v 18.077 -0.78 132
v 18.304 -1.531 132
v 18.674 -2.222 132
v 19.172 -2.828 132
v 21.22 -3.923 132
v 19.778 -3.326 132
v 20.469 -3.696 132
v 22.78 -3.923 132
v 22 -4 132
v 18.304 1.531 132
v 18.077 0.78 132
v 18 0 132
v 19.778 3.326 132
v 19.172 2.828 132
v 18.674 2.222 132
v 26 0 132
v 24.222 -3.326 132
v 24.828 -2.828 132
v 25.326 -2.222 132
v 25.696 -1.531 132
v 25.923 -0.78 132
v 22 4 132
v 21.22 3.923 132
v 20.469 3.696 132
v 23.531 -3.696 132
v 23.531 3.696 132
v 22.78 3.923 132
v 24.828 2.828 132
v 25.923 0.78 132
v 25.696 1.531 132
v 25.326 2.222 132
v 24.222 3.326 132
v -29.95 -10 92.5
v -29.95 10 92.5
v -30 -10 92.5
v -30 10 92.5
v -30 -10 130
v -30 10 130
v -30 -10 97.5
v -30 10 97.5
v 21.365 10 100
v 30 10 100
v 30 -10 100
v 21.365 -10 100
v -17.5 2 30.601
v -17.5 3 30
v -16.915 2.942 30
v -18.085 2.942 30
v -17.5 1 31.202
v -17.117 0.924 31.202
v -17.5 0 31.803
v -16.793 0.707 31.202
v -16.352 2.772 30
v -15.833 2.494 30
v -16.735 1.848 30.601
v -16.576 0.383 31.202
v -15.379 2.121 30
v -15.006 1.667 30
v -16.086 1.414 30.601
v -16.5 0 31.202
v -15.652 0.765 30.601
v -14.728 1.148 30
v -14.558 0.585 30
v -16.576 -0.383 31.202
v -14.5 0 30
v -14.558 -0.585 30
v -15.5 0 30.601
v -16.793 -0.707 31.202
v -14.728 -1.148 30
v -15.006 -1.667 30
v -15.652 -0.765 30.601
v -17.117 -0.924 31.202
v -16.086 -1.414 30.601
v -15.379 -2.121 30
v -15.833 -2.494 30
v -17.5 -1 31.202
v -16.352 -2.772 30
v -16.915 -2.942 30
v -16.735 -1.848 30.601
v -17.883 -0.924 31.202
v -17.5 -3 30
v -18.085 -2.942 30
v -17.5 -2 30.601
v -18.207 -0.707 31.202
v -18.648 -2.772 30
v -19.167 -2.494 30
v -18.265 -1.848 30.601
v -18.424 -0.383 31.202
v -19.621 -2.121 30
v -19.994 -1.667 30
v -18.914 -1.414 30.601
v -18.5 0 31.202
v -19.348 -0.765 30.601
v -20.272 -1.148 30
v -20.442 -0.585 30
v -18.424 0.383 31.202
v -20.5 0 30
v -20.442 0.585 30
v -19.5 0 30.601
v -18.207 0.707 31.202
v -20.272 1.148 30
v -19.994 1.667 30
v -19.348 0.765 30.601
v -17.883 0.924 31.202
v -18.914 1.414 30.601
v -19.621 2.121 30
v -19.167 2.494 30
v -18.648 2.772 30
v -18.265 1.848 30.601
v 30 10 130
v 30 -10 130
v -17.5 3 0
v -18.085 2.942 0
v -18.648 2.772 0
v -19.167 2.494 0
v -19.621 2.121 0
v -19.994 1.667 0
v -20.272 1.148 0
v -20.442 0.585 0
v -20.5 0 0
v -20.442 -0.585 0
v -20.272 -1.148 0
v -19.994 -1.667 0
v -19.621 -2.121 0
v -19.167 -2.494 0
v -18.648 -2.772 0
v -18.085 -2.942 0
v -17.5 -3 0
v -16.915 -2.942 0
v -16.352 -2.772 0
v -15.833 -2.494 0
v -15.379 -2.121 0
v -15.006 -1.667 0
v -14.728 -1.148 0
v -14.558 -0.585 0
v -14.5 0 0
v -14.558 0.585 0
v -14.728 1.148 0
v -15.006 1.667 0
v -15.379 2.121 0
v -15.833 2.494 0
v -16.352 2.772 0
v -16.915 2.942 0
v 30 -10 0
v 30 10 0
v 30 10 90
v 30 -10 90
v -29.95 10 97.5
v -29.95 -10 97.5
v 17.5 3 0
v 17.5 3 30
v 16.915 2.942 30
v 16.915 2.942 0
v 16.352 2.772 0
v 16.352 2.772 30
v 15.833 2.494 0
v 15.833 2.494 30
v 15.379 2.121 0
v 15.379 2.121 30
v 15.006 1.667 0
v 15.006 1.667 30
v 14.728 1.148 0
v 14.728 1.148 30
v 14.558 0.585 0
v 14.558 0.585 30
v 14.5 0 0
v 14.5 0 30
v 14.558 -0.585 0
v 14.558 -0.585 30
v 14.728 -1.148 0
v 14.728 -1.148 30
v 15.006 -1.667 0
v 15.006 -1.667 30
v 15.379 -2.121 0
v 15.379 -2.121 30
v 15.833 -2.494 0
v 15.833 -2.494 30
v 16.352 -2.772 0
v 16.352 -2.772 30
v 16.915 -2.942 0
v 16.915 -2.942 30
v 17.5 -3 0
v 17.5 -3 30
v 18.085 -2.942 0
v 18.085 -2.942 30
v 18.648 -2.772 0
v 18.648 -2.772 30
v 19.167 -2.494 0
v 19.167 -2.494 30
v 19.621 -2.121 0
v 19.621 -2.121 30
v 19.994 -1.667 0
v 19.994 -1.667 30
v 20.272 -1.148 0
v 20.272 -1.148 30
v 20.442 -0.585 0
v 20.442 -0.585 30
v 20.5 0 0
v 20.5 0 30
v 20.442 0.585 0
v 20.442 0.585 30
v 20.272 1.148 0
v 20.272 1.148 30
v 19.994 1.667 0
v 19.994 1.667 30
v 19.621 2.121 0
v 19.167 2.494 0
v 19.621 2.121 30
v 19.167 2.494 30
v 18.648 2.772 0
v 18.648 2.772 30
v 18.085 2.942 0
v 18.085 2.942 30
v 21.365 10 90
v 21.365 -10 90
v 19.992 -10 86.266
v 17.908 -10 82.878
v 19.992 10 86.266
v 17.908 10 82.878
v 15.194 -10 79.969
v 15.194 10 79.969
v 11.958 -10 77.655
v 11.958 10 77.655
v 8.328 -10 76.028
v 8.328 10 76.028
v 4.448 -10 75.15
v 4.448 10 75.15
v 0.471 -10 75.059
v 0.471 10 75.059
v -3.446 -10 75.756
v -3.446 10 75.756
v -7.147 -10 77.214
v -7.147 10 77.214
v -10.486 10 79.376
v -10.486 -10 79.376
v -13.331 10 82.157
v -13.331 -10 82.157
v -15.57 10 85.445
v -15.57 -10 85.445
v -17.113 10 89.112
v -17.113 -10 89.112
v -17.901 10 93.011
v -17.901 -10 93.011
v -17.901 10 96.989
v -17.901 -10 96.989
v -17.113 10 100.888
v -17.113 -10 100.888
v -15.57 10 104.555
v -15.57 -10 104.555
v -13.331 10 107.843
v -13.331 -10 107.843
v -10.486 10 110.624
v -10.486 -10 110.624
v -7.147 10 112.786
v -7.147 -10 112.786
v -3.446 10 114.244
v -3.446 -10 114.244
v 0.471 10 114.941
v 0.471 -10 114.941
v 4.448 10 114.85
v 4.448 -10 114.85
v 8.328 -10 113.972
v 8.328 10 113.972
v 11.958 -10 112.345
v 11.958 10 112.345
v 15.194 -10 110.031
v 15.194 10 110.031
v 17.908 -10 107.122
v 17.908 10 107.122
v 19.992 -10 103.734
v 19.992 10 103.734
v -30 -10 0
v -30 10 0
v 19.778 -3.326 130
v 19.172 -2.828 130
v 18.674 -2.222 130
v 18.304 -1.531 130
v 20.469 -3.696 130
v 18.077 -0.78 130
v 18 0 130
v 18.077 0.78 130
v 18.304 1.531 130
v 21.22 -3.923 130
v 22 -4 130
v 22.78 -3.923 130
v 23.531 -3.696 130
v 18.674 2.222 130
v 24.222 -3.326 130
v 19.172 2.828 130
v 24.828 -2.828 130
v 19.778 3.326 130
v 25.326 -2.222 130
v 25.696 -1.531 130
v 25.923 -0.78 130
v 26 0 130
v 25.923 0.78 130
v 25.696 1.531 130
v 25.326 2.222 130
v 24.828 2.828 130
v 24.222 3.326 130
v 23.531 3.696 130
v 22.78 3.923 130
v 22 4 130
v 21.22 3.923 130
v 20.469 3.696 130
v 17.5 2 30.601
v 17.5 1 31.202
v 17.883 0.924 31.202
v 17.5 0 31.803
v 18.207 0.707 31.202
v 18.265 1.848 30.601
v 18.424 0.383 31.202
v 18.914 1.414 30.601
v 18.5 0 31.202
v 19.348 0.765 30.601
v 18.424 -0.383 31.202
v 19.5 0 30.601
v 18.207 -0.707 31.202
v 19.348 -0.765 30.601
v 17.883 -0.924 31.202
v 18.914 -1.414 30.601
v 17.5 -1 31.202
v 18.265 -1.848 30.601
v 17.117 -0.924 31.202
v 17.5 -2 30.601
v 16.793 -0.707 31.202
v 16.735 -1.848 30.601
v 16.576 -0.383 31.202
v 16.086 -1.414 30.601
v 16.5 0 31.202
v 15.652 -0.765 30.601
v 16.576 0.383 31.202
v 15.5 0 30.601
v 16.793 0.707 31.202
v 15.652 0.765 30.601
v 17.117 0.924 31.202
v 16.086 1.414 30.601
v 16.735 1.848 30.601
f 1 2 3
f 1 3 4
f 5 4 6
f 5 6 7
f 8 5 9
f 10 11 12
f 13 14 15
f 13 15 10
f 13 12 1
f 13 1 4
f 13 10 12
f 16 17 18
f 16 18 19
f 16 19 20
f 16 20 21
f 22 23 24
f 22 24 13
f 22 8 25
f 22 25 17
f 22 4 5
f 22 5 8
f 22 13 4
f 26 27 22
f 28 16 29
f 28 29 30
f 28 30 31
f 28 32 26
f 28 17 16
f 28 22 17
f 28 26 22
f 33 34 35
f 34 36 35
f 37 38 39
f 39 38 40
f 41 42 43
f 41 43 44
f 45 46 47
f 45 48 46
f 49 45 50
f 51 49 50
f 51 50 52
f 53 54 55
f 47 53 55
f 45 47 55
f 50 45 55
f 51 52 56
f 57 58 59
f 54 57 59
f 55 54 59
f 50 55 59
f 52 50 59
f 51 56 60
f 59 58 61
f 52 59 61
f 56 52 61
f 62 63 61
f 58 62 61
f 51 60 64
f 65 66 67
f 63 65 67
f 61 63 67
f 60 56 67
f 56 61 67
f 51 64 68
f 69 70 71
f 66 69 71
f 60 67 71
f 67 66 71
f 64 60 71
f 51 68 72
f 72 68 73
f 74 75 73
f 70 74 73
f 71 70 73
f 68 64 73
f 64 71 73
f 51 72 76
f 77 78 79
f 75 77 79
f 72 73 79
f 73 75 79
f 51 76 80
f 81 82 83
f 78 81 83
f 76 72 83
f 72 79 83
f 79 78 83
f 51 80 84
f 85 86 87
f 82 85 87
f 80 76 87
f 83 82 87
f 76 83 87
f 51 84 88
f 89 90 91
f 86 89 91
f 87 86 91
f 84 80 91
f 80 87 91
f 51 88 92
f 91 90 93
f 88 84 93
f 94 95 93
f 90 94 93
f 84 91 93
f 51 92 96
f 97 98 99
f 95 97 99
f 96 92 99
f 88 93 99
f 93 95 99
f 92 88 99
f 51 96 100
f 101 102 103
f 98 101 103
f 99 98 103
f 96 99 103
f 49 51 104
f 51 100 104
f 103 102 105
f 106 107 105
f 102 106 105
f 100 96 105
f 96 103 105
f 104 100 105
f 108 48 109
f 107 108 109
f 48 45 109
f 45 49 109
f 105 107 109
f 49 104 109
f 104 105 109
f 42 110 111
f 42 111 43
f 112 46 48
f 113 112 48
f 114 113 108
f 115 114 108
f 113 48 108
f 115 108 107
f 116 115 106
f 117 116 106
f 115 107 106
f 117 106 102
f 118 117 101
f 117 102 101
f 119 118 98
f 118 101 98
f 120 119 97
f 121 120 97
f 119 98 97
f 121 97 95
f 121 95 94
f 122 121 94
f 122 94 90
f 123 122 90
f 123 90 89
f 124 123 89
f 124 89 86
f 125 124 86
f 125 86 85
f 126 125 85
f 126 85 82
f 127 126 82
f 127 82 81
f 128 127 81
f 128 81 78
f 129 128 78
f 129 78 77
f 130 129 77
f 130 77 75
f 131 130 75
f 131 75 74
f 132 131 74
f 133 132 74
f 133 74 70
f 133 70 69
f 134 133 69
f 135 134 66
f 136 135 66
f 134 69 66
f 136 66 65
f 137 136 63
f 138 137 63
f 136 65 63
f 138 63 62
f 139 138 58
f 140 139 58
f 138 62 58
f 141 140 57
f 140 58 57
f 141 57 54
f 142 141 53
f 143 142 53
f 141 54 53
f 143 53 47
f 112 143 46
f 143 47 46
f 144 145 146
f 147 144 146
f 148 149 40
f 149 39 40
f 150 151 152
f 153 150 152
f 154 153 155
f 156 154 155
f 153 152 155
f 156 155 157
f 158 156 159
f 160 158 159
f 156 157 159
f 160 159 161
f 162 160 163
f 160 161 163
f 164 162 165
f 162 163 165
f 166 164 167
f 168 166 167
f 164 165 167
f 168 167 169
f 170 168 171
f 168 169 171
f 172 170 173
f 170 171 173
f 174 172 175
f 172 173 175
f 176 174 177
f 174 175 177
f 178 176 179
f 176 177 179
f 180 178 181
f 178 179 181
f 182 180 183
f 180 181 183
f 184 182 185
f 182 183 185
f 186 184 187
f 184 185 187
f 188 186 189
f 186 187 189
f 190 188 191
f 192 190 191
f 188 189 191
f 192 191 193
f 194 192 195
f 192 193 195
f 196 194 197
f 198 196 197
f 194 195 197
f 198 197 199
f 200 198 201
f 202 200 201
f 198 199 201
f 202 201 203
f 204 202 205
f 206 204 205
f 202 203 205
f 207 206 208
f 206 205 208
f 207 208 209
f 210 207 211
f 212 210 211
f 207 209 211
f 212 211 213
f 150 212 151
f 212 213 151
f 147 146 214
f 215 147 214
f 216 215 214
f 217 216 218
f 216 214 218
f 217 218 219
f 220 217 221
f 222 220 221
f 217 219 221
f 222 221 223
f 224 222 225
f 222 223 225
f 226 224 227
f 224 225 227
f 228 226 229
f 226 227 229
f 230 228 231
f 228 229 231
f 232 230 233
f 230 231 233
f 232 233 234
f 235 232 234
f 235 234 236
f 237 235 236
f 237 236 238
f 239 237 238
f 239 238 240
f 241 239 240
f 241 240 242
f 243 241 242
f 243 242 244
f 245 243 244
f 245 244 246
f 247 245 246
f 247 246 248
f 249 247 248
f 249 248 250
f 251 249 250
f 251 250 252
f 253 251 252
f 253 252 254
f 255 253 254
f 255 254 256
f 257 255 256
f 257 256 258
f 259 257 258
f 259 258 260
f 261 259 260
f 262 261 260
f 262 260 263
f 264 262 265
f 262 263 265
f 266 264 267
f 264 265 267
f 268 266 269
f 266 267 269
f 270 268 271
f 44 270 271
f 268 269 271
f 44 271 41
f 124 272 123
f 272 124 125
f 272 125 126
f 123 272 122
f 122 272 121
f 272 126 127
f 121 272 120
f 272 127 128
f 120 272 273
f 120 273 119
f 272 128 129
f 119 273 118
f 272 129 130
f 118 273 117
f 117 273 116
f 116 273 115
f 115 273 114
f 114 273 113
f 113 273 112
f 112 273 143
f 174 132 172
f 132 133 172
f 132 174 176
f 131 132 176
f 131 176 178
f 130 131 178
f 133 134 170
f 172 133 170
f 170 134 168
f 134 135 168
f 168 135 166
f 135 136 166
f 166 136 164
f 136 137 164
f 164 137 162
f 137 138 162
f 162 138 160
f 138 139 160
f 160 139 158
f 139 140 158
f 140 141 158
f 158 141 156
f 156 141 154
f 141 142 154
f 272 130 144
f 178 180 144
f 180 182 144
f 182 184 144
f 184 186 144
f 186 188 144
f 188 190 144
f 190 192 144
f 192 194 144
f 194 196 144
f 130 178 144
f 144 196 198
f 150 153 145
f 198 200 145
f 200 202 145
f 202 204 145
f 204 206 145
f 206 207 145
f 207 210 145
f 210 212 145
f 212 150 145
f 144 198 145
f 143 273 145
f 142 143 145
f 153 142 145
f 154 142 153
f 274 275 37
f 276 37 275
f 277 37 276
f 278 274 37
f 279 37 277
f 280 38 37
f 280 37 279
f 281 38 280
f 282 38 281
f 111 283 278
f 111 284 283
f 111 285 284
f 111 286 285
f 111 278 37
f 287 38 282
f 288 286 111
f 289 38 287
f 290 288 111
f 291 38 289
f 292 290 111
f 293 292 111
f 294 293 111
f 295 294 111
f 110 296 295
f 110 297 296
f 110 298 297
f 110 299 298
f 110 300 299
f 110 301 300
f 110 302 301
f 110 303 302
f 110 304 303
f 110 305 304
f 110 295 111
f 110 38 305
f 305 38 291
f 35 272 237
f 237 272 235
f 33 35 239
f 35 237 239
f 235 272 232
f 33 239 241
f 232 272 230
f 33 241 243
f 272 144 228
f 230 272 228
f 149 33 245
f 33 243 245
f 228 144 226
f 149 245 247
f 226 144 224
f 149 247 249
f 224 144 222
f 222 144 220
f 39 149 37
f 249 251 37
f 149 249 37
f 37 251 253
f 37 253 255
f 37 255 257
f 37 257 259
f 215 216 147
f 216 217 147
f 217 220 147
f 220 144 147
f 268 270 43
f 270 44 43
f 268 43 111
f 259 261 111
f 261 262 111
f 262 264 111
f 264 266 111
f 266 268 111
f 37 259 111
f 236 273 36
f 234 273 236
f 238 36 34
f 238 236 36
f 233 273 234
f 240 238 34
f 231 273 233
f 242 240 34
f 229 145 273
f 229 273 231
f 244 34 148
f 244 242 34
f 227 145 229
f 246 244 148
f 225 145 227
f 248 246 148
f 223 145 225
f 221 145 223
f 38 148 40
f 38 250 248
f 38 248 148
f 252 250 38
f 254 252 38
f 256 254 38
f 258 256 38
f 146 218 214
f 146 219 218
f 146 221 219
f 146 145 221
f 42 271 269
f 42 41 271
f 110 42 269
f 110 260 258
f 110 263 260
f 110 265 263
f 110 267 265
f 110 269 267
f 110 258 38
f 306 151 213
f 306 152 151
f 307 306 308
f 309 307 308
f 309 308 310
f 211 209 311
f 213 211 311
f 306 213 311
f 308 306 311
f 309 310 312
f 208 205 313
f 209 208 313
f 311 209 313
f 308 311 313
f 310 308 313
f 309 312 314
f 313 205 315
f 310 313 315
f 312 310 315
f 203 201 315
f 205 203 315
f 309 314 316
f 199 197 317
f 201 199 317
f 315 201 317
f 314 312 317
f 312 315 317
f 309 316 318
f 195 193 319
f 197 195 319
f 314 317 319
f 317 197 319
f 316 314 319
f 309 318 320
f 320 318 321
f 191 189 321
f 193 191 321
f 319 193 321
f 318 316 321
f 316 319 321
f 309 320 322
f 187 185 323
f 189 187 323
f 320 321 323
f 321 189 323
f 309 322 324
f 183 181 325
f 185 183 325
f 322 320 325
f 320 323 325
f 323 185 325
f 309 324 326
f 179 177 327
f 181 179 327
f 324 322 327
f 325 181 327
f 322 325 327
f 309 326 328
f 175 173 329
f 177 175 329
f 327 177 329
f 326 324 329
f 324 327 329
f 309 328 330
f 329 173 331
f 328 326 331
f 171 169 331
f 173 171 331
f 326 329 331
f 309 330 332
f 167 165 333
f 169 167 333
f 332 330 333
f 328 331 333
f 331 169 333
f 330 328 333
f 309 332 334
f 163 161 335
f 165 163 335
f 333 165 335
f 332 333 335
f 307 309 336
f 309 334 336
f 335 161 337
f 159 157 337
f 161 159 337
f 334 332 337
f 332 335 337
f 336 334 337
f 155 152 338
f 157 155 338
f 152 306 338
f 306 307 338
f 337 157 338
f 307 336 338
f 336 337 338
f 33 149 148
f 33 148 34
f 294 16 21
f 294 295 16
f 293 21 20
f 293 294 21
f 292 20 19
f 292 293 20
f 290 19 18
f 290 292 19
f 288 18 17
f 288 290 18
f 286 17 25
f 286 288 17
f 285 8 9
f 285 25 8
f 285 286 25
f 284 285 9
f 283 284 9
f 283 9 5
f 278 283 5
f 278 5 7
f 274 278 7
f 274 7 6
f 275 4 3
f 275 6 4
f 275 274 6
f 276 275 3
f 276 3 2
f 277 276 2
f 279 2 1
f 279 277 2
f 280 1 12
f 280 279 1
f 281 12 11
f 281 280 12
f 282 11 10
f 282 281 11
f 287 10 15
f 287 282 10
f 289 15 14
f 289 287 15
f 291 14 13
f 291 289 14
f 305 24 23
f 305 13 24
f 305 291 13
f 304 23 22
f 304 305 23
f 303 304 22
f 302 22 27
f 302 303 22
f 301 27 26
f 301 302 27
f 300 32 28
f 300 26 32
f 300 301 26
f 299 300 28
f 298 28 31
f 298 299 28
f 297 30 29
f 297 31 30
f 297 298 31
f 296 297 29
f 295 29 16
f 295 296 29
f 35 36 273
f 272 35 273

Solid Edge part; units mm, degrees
sketch "Sketch1" plane through (0, 0, 0) normal (0, -1, 0) x (1, 0, 0)
  line L0 (-30, 130) -> (30, 130)
  line L1 (30, 130) -> (30, 100)
  line L2 (30, 100) -> (21.3649, 100)
  line L3 (30, 90) -> (21.3649, 90)
  line L4 (30, 0) -> (30, 90)
  line L5 (-30, 0) -> (30, 0)
  line L6 (-30, 130) -> (-30, 0)
  arc A0 (21.3649, 90) -> (21.3649, 100) centre (2, 95) cw
extrude "Protrusion1" add sketch "Sketch1" along normal mid plane 20
hole "Agujero_1" at (17.5, 0, 0) direction (0, 0, 1) diameter 6 depth 30 tip angle 118
hole "Hole1" at (-17.5, 0, 0) direction (0, 0, 1) diameter 6 depth 30 tip angle 118
sketch "Sketch2" plane through (0, 0, 130) normal (0, 0, 1) x (1, 0, 0)
  circle A0 centre (22, 0) radius 4
  dimension "D1" = 8
  dimension "D2" = 8
extrude "ProtrusiónExtruida_2" add sketch "Sketch2" along normal blind 2
sketch "Sketch3" plane through (-30, 0, 65) normal (-1, 0, 0) x (0, 0, -1)
  line L0 (-32.5, 10) -> (-32.5, -10)
  line L1 (-32.5, -10) -> (-27.5, -10)
  line L2 (-27.5, -10) -> (-27.5, 10)
  line L3 (-27.5, 10) -> (-32.5, 10)
  dimension "D1" = 2.5
  dimension "D2" = 2.5
  dimension "D3" = 5
extrude "VaciadoExtruido_1" cut sketch "Sketch3" against normal blind 0.05
